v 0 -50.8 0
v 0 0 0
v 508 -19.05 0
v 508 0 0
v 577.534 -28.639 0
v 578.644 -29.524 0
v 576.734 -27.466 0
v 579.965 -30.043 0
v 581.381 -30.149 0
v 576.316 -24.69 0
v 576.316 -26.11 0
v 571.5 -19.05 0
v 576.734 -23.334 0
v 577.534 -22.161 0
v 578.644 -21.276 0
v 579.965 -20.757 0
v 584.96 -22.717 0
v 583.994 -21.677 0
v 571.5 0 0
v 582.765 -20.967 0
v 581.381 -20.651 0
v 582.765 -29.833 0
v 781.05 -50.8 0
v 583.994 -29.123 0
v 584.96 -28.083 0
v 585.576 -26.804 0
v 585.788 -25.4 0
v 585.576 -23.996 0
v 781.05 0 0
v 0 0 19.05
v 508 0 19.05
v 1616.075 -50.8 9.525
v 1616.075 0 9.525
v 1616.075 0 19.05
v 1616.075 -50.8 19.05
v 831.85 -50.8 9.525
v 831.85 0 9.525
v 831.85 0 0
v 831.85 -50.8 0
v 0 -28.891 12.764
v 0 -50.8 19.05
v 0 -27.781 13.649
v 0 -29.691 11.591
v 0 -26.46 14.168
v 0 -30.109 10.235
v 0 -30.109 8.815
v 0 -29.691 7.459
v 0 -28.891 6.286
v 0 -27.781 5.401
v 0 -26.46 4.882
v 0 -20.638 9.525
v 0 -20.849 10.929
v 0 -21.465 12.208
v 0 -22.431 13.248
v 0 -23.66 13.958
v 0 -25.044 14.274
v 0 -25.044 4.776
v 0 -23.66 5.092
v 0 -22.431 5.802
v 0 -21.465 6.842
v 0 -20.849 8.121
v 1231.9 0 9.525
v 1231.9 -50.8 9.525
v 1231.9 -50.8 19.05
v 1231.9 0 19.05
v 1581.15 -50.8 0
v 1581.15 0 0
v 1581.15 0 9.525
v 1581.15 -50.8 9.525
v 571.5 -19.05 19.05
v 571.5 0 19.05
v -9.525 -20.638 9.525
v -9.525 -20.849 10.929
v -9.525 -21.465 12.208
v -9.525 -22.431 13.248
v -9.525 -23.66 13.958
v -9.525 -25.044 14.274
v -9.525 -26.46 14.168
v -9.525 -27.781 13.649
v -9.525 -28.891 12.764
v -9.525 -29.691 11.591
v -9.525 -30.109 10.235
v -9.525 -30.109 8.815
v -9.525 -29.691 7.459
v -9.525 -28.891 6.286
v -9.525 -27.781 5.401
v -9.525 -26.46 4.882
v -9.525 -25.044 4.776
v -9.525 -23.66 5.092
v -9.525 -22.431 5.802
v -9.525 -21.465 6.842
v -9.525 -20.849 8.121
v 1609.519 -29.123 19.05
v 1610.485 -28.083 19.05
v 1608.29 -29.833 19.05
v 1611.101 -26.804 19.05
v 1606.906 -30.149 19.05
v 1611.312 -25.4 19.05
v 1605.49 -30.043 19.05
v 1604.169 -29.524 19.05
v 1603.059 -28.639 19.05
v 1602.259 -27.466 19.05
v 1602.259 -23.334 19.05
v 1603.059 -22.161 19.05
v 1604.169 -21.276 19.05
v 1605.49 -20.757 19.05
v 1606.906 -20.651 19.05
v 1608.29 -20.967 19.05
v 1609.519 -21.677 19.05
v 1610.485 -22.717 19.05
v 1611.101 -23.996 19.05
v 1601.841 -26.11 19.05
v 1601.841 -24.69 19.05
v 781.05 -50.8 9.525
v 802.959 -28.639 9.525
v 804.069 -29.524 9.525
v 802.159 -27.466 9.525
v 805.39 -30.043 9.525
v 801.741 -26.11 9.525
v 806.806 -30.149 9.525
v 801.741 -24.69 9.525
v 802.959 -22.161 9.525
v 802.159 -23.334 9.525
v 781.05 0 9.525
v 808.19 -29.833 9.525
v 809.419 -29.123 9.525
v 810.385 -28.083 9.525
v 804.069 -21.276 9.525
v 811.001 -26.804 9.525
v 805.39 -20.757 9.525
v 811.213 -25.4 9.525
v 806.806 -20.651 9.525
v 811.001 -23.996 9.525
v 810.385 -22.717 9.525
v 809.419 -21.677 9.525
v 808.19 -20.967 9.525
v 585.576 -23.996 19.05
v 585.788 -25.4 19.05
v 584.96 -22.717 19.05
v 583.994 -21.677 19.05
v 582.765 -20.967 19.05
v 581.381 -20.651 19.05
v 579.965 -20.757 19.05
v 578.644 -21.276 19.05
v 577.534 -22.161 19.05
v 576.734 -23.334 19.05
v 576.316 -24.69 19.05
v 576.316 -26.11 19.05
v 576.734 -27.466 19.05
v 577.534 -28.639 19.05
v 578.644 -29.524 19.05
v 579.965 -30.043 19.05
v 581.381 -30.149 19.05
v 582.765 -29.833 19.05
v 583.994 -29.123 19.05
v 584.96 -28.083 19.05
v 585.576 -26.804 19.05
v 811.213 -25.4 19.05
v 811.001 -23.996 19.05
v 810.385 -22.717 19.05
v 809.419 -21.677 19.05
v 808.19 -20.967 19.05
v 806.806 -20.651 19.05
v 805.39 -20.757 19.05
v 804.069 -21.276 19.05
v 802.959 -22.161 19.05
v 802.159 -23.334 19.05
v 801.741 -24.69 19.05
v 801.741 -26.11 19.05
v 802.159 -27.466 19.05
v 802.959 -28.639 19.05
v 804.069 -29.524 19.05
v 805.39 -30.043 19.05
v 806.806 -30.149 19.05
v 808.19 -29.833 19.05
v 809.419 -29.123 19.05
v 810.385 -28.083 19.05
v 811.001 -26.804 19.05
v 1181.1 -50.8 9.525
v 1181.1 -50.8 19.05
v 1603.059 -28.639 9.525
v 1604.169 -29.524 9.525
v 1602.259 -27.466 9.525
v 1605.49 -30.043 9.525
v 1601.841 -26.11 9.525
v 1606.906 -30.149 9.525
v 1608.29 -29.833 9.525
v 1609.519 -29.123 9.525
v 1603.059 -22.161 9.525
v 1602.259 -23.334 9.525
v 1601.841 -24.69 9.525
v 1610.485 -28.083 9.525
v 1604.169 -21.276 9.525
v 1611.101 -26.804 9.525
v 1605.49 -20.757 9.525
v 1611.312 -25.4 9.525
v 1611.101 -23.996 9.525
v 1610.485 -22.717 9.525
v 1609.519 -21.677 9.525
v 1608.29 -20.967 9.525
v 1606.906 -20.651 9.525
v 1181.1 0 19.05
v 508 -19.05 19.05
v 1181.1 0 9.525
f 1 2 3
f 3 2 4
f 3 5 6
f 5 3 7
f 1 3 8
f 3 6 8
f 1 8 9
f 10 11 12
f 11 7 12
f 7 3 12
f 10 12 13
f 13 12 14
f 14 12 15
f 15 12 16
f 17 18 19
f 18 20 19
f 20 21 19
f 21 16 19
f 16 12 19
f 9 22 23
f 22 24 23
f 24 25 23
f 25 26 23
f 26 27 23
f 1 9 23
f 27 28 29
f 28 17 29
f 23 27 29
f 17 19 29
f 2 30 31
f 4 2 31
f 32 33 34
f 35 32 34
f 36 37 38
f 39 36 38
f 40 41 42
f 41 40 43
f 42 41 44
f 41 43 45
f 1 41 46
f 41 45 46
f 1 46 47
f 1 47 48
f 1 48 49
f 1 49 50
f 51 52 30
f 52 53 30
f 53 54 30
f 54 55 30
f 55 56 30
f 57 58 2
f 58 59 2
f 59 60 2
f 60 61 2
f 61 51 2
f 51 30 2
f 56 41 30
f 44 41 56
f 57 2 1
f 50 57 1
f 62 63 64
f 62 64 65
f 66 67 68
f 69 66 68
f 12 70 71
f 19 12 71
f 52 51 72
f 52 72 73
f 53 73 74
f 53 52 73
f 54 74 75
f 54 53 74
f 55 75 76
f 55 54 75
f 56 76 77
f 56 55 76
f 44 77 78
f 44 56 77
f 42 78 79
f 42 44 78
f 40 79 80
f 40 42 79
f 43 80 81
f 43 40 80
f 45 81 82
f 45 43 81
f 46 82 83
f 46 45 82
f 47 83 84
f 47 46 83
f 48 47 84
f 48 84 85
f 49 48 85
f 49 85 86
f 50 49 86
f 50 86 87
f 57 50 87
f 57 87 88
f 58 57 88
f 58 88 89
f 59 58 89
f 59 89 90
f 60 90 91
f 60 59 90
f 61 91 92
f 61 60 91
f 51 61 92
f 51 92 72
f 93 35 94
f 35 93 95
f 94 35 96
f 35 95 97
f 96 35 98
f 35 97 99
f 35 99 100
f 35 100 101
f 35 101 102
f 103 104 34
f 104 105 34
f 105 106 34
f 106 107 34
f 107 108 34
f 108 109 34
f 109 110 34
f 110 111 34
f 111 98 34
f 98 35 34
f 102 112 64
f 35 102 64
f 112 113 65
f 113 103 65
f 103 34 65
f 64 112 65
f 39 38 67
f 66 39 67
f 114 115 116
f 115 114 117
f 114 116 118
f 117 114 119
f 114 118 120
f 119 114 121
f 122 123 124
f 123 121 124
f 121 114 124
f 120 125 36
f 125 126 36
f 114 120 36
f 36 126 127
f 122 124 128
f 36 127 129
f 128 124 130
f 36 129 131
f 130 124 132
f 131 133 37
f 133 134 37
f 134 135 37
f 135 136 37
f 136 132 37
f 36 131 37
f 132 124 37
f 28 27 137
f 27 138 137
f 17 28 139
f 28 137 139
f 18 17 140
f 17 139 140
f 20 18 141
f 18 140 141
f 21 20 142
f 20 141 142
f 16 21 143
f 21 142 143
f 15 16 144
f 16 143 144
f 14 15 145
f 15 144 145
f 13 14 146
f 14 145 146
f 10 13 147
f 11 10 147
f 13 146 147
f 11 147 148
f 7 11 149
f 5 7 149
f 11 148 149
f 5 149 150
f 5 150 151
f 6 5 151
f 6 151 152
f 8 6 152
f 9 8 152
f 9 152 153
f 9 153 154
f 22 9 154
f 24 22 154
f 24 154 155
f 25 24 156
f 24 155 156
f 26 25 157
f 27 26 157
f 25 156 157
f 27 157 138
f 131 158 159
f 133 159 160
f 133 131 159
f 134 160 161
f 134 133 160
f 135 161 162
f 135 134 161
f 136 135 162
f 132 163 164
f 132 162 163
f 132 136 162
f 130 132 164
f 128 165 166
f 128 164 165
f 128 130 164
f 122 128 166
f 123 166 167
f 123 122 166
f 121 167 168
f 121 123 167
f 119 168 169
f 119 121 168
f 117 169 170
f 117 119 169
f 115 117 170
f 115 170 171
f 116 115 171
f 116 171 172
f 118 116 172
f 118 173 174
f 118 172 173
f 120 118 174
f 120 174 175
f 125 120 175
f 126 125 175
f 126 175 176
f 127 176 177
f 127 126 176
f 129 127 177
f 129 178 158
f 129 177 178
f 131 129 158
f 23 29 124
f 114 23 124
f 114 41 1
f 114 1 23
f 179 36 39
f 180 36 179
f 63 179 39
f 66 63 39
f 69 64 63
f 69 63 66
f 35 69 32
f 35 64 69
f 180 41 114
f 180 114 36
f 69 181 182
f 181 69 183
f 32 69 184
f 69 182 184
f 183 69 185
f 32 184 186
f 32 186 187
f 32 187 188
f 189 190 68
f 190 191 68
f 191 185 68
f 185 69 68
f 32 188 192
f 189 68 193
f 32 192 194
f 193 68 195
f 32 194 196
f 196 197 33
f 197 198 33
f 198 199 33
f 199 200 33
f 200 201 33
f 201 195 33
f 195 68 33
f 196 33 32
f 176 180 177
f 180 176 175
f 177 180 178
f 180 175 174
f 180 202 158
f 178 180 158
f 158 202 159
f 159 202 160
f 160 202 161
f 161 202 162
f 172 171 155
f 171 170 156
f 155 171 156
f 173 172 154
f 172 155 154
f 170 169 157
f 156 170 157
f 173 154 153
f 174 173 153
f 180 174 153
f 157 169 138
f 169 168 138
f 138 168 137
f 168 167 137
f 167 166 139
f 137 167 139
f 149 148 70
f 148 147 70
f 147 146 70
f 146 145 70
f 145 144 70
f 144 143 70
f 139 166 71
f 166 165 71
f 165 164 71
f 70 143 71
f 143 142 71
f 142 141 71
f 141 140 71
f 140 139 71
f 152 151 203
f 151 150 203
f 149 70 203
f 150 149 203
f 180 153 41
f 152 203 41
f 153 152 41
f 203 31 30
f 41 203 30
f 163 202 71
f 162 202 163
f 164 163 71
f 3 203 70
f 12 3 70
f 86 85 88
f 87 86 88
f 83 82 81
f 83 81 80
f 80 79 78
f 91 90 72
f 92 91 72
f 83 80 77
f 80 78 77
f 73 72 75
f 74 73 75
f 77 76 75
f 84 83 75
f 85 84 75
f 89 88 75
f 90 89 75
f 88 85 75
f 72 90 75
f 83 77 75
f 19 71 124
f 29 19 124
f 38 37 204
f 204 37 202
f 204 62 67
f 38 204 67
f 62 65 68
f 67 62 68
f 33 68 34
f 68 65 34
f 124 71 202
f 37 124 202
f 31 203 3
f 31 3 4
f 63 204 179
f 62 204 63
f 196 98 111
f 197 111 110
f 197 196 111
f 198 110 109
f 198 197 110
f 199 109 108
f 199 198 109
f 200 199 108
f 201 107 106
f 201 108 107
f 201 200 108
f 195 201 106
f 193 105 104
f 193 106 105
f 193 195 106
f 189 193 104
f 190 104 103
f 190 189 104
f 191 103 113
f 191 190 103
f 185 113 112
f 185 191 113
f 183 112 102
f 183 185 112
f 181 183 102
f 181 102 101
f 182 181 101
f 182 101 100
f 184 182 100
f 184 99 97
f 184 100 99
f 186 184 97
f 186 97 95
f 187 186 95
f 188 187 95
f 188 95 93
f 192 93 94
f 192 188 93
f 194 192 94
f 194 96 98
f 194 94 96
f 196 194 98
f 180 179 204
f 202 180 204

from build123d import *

# Parameters (mm, degrees)
F1_DEPTH = 50.8
F3_R     = 4.7625
F3_W     = 63.5
F3_H     = 101.6
F4_DEPTH = 12.7
F5_R     = 4.7625
F6_DEPTH = 9.525
F7_W     = 50.8
F7_H     = 130.0629
F8_DEPTH = 25.4


with BuildPart() as f1:
    # F0 (on Front) → F1 (new body)
    with BuildSketch(Plane.XZ):
        Polygon((1616.075, 9.525), (1616.075, 19.05), (0, 19.05), (0, 0), (781.05, 0), (781.05, 9.525), (831.85, 9.525), (831.85, 0), (1581.15, 0), (1581.15, 9.525), align=None)
    extrude(amount=F1_DEPTH)

    # F3 (on offset) → F4 (cut, symmetric)
    with BuildSketch(Plane.XY.offset(9.525)):
        with Locations((806.45, -25.4)):
            Circle(F3_R)
        with Locations((1606.55, -25.4)):
            Circle(F3_R)
        with Locations((581.025, -25.4)):
            Circle(F3_R)
        with Locations((539.75, 31.75)):
            Rectangle(F3_W, F3_H)
    extrude(amount=F4_DEPTH, both=True, mode=Mode.SUBTRACT)

    # F5 (on Right) → F6 (join)
    with BuildSketch(Plane.YZ):
        with Locations((-25.4, 9.525)):
            Circle(F5_R)
    extrude(amount=-F6_DEPTH)

    # F7 (on offset) → F8 (cut)
    with BuildSketch(Plane.XY.offset(9.525)):
        with Locations((1206.5, -27.952656)):
            Rectangle(F7_W, F7_H)
    extrude(amount=F8_DEPTH, mode=Mode.SUBTRACT)


solid = f1.part
